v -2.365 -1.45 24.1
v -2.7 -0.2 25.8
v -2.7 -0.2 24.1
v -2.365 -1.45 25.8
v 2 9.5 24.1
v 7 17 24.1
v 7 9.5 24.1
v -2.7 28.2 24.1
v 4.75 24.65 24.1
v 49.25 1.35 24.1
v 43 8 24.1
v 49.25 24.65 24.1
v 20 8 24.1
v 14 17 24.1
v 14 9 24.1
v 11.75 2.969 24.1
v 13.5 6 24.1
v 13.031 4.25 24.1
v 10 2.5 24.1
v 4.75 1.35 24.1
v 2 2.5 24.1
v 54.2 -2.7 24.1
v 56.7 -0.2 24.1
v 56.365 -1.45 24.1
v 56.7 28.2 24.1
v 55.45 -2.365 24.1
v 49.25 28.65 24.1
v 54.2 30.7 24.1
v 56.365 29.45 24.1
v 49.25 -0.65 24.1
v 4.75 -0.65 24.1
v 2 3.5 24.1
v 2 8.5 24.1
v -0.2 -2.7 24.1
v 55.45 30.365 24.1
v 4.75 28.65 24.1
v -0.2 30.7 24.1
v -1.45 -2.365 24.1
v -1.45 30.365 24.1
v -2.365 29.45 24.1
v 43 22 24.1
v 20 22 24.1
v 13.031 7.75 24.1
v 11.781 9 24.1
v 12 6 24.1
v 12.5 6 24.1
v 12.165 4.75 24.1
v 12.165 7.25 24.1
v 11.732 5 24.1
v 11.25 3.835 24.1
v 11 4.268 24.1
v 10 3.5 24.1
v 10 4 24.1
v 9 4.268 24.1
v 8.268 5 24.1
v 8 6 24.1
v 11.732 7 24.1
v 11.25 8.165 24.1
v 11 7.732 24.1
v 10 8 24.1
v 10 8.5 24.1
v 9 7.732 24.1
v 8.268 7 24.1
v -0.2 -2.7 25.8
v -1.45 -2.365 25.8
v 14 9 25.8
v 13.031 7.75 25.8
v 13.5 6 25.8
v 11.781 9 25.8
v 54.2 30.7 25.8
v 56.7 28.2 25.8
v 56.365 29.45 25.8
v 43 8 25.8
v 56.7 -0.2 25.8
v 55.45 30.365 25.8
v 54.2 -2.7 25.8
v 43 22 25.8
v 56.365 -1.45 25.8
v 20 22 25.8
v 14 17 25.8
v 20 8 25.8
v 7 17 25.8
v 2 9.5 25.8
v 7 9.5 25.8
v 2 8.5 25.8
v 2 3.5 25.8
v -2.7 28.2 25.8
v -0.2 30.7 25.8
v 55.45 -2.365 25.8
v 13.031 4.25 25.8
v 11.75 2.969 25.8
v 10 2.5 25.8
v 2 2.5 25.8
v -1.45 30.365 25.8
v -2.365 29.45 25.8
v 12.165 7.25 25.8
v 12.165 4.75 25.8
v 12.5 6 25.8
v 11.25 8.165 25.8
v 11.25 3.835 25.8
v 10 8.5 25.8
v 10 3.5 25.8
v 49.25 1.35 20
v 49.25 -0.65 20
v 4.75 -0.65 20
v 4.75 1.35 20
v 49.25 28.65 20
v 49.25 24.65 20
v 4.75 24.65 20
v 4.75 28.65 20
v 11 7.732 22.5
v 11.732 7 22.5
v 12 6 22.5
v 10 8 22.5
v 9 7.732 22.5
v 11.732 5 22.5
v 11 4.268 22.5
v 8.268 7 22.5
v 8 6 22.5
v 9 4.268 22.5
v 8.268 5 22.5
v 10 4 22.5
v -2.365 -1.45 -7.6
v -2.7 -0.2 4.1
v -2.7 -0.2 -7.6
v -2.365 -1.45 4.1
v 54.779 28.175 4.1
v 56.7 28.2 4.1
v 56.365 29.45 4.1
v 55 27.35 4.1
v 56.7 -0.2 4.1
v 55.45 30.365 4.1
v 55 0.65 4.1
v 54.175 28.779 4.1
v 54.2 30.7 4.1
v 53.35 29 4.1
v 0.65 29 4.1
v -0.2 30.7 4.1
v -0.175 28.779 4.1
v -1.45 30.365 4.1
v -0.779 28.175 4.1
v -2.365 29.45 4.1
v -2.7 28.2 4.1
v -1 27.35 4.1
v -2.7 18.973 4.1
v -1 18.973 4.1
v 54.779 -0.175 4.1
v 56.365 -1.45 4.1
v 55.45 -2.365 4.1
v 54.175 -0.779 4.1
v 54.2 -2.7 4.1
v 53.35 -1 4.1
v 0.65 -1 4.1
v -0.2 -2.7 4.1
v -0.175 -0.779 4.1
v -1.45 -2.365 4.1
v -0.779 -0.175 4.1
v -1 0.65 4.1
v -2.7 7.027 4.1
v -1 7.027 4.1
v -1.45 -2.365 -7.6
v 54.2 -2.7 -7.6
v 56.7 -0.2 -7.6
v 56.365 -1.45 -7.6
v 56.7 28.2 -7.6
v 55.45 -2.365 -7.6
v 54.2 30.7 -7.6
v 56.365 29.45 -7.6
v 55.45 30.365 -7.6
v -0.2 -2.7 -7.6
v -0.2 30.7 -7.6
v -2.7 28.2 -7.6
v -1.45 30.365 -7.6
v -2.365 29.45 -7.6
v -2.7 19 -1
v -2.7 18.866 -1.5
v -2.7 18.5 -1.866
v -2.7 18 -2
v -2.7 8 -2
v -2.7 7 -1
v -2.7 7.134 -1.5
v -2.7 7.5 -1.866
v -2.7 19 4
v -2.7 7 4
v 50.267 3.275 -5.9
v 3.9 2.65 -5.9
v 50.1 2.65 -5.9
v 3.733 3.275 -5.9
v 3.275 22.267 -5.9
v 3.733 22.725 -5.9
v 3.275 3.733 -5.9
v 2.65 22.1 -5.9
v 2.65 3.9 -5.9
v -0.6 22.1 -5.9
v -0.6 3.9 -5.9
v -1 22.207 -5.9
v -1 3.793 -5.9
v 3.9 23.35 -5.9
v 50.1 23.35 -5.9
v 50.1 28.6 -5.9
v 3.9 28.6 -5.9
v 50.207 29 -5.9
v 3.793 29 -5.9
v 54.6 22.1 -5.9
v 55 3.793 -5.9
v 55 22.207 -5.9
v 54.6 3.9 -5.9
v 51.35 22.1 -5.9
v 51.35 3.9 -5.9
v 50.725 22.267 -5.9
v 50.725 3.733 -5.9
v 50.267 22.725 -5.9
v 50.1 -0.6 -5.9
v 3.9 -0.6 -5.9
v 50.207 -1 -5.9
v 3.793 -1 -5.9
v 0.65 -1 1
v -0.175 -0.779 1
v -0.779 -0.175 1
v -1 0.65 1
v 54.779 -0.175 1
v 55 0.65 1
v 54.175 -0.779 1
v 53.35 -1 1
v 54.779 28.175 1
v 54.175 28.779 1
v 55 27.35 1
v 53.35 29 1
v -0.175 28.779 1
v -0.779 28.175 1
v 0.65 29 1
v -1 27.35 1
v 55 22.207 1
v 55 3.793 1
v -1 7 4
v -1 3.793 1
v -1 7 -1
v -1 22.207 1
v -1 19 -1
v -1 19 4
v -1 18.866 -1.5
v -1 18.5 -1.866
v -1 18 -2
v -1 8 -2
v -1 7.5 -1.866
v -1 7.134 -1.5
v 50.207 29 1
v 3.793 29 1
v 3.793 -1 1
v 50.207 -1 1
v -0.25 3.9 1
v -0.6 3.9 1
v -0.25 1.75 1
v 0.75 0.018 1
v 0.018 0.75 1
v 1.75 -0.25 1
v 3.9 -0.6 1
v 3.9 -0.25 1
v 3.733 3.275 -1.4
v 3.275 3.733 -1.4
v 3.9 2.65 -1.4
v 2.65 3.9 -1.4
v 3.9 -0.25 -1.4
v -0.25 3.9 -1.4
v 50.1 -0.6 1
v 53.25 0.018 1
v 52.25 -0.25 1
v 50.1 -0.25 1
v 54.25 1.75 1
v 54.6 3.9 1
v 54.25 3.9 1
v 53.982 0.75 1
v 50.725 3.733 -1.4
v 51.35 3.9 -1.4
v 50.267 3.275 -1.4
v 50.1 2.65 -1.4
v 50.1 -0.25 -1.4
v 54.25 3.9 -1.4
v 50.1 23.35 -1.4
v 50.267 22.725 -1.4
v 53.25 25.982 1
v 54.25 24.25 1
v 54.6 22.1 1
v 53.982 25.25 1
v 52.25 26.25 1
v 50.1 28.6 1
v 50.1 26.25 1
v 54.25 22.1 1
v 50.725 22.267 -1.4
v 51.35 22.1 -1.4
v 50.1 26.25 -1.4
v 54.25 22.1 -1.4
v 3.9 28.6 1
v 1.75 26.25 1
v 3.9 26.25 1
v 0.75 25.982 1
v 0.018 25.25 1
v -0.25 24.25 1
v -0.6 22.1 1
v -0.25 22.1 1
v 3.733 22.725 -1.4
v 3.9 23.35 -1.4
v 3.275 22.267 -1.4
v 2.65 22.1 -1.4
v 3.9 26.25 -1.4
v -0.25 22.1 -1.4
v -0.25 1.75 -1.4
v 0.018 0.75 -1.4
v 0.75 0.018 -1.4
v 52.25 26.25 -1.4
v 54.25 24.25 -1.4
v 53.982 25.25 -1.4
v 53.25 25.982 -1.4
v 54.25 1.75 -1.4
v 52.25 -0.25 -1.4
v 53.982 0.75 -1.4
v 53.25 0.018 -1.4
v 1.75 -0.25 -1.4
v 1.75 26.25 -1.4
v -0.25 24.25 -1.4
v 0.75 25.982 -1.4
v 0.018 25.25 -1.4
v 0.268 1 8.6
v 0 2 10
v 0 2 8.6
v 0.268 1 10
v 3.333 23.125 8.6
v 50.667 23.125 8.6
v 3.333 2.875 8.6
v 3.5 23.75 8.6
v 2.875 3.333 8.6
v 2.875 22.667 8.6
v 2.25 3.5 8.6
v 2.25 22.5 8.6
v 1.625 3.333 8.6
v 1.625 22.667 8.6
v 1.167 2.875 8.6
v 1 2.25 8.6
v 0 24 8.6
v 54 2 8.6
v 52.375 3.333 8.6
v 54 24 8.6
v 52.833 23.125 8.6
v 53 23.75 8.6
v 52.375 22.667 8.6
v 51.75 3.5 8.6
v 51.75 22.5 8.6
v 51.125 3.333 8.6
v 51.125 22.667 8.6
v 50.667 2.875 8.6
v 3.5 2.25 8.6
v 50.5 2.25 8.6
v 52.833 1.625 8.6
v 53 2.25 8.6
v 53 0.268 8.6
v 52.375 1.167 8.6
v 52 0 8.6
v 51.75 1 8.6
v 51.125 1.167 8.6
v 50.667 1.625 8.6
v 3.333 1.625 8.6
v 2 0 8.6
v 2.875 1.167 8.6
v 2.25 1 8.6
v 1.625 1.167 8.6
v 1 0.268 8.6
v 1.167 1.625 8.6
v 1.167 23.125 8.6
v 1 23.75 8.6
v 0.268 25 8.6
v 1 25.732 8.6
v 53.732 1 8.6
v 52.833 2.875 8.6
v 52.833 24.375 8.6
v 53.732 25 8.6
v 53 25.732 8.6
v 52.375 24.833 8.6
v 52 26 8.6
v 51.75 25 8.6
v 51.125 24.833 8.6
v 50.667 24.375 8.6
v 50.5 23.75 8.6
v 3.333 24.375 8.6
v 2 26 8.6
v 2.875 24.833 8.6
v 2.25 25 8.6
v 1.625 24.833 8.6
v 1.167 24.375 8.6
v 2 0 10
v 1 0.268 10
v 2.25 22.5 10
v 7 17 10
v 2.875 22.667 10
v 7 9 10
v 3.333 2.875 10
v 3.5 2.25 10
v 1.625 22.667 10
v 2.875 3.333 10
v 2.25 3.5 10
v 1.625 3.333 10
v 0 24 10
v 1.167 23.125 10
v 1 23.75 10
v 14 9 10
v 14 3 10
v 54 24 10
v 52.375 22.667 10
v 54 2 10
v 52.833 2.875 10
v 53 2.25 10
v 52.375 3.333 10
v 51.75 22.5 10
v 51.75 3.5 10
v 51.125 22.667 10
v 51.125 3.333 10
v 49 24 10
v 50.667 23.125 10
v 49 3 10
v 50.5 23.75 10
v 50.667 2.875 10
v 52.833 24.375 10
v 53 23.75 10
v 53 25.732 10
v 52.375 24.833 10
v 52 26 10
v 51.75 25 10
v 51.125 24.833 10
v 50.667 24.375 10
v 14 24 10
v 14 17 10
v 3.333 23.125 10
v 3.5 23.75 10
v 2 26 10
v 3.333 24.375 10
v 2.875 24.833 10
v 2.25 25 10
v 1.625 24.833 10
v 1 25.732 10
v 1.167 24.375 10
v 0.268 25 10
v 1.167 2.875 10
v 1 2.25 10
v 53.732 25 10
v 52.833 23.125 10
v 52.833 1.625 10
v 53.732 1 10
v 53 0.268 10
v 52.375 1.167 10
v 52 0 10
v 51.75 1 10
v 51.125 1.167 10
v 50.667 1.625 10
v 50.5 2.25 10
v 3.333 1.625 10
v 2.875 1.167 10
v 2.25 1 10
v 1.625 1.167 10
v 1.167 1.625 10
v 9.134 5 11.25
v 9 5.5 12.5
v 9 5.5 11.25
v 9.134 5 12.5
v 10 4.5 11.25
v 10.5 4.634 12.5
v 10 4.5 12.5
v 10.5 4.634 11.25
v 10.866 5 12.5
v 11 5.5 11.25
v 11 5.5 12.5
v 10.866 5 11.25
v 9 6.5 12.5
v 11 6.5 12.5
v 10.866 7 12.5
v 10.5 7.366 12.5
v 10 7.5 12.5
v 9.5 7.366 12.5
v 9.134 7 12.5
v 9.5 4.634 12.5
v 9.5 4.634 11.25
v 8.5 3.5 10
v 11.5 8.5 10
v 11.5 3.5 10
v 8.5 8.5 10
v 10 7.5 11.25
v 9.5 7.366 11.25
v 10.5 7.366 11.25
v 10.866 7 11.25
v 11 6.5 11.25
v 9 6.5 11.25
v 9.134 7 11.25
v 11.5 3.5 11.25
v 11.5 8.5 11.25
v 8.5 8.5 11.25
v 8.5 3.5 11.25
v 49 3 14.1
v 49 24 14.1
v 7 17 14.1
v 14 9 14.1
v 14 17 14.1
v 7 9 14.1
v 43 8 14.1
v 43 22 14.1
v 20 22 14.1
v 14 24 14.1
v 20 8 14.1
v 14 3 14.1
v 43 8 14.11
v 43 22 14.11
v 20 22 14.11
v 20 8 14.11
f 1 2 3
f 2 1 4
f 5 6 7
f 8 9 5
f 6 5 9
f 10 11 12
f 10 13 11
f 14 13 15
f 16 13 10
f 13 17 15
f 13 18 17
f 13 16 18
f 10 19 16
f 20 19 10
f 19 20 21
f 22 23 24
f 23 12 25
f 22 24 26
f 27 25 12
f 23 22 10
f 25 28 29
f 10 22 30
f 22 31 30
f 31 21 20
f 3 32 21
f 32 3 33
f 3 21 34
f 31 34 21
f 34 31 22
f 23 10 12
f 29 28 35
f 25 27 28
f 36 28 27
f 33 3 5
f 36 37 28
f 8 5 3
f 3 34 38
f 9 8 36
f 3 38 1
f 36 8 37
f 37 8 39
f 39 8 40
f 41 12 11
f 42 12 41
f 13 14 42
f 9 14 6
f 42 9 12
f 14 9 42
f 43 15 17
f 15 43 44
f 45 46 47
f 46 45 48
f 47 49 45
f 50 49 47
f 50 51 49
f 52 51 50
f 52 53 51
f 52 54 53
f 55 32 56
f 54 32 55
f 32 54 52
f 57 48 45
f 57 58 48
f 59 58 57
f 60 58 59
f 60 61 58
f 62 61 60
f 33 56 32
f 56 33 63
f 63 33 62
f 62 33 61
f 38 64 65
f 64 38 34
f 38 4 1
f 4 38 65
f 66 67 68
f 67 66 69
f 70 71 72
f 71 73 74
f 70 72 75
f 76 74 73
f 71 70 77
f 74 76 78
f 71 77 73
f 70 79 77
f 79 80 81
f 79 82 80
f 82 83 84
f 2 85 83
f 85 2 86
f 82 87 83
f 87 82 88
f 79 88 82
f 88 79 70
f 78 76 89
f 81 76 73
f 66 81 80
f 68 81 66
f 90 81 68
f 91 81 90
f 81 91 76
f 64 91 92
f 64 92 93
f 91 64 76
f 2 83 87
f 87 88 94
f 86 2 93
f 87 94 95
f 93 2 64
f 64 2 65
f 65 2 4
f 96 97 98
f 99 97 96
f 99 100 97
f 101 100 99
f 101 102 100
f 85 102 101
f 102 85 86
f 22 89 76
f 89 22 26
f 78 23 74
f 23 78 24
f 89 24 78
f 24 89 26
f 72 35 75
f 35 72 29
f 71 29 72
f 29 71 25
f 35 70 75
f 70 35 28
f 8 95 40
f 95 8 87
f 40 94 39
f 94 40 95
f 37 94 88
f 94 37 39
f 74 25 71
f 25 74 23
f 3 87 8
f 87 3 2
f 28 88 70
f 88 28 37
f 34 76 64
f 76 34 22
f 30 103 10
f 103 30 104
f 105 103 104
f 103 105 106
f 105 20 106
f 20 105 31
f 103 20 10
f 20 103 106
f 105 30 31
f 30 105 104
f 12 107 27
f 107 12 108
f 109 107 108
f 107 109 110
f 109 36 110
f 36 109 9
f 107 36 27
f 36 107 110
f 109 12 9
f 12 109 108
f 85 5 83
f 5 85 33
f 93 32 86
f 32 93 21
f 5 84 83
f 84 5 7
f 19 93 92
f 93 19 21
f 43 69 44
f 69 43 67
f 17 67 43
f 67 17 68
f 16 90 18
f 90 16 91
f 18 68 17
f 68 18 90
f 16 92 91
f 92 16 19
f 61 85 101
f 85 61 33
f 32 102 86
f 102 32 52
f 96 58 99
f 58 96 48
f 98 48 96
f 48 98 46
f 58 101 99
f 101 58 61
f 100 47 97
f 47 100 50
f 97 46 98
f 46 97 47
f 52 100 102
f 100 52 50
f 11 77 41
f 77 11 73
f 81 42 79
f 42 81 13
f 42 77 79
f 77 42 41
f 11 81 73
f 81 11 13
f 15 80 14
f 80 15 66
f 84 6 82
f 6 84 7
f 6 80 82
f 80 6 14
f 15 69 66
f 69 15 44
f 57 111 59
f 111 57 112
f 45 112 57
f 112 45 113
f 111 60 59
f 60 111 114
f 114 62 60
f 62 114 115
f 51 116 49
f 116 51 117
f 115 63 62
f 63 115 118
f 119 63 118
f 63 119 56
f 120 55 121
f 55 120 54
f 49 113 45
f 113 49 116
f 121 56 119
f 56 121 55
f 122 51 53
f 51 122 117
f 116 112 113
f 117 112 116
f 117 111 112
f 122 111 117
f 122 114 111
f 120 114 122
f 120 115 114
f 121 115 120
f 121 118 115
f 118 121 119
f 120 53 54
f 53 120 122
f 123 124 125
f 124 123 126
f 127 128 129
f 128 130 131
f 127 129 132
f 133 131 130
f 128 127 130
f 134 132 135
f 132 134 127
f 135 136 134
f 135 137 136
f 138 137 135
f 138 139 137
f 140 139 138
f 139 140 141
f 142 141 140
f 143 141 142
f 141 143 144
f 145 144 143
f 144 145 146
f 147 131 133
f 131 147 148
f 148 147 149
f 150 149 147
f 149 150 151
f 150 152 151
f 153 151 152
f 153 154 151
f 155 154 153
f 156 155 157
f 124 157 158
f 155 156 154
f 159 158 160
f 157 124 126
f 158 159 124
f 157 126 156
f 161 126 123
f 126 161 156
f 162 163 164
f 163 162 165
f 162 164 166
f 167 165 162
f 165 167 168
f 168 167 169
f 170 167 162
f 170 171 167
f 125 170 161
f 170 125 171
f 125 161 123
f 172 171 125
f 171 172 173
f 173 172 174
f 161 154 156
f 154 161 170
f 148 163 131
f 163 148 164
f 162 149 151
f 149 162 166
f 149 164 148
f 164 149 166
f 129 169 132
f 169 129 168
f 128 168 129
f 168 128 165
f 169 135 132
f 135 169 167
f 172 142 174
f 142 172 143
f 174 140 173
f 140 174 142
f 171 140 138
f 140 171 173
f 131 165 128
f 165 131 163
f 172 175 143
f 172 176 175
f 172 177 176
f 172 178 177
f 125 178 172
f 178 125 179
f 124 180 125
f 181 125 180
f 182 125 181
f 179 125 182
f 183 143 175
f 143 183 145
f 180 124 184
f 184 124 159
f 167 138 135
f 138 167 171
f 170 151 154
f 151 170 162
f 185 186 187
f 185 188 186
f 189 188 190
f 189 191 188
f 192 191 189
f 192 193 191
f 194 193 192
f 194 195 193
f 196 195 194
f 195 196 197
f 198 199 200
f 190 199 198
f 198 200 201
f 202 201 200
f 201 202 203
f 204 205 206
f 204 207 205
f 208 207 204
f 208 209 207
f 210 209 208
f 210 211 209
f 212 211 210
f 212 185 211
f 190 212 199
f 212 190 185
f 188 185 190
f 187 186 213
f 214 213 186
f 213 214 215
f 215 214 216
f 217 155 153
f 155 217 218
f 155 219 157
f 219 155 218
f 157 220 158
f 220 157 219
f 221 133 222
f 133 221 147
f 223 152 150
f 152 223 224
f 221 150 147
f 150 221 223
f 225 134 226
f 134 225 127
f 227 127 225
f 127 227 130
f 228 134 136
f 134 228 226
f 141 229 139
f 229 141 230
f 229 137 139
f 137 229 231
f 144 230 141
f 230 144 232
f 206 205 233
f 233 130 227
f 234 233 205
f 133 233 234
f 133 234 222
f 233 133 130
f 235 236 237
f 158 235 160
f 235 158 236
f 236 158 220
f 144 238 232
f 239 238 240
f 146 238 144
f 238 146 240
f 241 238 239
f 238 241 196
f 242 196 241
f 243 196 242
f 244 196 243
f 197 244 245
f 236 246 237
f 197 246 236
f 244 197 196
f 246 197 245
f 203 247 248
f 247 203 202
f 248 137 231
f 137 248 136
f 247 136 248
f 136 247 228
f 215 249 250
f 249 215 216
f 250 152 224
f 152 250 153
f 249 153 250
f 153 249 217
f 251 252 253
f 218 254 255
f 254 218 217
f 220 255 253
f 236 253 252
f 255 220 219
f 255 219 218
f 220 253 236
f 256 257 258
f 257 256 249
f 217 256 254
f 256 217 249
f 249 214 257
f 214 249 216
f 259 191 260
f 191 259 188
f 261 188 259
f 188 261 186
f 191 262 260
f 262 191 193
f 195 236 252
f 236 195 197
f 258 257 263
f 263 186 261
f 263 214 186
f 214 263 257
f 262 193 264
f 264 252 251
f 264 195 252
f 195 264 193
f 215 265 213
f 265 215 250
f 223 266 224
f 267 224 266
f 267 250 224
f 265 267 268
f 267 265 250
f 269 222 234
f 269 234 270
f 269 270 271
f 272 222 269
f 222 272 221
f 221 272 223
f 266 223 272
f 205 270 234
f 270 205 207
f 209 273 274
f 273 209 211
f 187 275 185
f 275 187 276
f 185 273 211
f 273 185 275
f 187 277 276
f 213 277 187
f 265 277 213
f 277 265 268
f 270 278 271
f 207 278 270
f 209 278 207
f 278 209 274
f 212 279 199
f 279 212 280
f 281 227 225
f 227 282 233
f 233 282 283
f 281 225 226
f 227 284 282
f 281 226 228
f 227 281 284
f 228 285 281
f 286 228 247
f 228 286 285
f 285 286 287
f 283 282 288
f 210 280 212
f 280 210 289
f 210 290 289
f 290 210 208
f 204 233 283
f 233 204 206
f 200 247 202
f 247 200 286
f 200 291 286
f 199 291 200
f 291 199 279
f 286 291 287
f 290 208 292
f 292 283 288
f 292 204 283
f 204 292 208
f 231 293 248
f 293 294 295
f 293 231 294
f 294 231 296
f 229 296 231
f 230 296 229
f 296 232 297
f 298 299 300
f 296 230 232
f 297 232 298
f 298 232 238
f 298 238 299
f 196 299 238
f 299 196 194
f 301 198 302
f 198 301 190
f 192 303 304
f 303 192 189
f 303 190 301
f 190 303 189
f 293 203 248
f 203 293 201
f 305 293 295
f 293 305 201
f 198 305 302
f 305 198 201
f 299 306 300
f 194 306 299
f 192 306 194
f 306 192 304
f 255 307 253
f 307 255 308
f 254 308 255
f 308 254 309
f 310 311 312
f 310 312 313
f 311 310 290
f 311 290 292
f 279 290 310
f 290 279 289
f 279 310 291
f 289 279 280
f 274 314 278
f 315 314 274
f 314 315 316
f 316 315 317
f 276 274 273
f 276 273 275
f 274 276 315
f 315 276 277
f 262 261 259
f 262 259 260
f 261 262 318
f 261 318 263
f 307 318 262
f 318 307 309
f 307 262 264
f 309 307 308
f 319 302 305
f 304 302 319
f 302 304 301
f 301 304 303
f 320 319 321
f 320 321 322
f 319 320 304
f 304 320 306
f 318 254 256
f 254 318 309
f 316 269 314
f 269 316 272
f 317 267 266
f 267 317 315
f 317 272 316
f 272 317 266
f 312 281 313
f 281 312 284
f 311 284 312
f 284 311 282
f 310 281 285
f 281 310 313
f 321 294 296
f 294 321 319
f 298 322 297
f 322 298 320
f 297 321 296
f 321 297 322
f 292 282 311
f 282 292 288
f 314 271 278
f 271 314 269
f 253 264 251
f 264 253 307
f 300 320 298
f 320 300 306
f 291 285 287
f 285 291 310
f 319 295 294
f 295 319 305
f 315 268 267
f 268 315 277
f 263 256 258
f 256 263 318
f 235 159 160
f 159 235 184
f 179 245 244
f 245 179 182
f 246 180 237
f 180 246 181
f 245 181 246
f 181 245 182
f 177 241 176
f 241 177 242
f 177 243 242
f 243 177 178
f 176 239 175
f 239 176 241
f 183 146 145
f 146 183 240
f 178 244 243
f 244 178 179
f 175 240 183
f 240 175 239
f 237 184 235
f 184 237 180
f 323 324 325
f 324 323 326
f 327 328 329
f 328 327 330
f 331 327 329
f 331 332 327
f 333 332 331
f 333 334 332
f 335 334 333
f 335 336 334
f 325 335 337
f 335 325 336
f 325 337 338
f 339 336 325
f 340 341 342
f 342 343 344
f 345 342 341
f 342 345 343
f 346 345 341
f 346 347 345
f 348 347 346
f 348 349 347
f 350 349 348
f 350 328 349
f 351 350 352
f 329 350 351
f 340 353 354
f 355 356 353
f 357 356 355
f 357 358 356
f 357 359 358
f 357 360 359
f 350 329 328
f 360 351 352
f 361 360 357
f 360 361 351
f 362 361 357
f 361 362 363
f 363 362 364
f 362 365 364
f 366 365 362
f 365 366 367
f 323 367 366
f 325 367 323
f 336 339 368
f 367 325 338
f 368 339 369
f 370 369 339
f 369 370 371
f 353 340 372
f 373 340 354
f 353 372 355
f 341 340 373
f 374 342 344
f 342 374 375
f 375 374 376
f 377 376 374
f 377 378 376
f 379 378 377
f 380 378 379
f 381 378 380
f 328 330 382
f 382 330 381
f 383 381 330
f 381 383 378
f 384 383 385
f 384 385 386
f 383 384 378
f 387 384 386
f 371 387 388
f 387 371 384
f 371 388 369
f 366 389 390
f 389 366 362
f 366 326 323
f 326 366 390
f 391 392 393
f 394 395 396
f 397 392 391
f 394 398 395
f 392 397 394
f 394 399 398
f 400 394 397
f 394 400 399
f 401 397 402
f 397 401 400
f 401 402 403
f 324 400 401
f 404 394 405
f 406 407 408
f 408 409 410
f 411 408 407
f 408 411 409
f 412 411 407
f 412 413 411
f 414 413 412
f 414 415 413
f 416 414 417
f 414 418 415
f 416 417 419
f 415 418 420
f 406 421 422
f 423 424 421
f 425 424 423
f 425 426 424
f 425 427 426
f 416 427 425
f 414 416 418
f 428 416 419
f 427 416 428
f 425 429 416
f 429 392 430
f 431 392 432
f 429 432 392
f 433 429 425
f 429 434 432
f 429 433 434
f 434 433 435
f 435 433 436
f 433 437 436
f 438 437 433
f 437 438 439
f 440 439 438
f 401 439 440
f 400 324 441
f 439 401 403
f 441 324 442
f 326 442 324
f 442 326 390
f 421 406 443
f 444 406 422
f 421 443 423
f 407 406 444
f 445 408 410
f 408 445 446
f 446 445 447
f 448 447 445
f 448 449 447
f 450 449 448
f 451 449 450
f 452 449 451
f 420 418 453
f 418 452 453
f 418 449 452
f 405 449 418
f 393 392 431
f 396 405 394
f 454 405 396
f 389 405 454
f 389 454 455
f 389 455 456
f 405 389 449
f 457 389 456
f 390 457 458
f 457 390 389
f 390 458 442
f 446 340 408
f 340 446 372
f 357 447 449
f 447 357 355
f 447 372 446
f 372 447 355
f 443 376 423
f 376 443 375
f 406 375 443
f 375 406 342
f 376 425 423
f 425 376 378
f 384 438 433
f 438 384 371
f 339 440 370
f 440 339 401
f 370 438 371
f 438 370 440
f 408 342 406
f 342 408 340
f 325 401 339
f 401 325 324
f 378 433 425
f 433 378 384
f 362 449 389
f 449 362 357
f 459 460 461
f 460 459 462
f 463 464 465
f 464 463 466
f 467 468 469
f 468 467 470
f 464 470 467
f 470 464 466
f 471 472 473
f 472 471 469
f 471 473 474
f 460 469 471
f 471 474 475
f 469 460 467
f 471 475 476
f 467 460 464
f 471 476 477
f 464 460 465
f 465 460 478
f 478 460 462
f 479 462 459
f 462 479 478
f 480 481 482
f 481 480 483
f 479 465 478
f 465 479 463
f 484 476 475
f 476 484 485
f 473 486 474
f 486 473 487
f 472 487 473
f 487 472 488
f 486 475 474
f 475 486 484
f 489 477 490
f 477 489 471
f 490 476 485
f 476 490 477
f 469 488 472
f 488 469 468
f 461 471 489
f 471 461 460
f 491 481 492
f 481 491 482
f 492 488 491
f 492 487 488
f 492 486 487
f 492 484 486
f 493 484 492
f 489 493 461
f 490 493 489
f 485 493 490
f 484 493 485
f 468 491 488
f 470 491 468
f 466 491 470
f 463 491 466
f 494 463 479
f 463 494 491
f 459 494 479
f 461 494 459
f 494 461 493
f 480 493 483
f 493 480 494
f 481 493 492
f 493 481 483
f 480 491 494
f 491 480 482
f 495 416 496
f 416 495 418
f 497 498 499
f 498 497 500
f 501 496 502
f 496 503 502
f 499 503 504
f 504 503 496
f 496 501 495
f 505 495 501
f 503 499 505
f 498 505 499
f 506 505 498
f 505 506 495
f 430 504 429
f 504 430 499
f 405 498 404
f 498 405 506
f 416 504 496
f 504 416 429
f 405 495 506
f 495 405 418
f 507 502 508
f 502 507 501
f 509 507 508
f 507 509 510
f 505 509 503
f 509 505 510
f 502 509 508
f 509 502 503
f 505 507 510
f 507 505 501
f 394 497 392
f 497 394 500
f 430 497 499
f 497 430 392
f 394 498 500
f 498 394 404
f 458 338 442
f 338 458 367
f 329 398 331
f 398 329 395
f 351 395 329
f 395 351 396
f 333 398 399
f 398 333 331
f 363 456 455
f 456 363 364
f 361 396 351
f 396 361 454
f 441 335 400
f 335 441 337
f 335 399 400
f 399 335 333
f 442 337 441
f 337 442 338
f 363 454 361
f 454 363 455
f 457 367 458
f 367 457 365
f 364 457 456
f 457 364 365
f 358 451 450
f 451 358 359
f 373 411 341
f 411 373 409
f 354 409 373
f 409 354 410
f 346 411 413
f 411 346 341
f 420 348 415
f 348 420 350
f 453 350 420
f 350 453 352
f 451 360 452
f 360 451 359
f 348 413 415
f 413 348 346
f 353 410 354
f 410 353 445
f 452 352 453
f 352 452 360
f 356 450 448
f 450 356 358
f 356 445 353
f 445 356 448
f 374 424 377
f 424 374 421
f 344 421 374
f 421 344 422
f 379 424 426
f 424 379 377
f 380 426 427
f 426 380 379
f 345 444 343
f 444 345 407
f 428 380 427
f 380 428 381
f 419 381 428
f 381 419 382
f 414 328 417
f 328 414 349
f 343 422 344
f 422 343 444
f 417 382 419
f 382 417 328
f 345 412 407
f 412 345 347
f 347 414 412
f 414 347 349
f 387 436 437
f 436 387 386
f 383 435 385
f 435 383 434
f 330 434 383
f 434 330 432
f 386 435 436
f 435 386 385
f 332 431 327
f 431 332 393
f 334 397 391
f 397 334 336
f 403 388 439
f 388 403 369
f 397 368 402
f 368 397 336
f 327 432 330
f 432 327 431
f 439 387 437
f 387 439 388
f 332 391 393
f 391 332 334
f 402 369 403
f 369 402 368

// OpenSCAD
showLid = true;
showBox = true;
showPCB = true;
arrangeForPrinting = false;
pcbExploded = 10;
lidExploded = 20;

// the board
pcbWidth = 26;
pcbLength = 54;
pcbThickness = 1.4;
pcbCornerRadius = 2;
pcbHolesFromCorners = 2.25;
pcbHoleDiameter = 2.5;

// board features
buttonPositions = [[10, 6]];
buttonHeight = 2.5;
screenGeometry = [14, 3, 35, 21, 4.1]; // x, y, length, width, z-height above the board of the whole screen block
screenFrameGeometry = [20, 8, 23, 14]; // x, y, length, width
usbLeftY = 7;
usbWidth = 12;
usbHeight = 7;
otherUpwardCutouts = [[7, 9, 7, 8]]; // x, y, length, width: this one is for the DIP switches

boxInnerHeight = 10;
boxRadius = 2.5;
pcbClearances = [1, 1, 1, 3]; // space between the box and the PCB: left, right, bottom, top
pcbFitClearance = 0.25; // adjust for your printer in case inner-hole sizes are too small and the PCB won't fit
pcbHolderExtraHeight = 1; // corner bosses stick up this much higher than the PCB
wallThickness = 1.7;
lipPcbOverlap = 1;	// How much of the edge of the PCB the lips should cover
lipClearance = 0.35;	// How much to inset lips for looser fit
$fn=12;

// -----------------------------------------
boxLength = pcbLength + wallThickness * 2 + pcbClearances[0] + pcbClearances[1];
boxWidth = pcbWidth + wallThickness * 2 + pcbClearances[2] + pcbClearances[3];
boxHeight = boxInnerHeight + wallThickness;
boxBottomToPcbTop = boxHeight - screenGeometry[4];
cornerStrutMinSize = pcbHolesFromCorners + pcbHoleDiameter;
lipHeight = boxHeight - boxBottomToPcbTop; // rails on the underside of the lid holding it in the box

module quad(length, width) {
	children([0:$children-1]);
	translate([length, 0, 0])
		children([0:$children-1]);
	translate([length, width, 0])
		children([0:$children-1]);
	translate([0, width, 0])
		children([0:$children-1]);
}

module roundCornersCube(dims, r=1, centerXY=false)
{
	translate(centerXY ? [dims[0] / -2, dims[1] / -2, 0] : [0,0,0])
	union() {
		translate([0, r, 0])
			cube([dims[0], dims[1] - r * 2, dims[2]]);
		translate([r, 0, 0])
			cube([dims[0] - r * 2, dims[1], dims[2]]);
		translate([r, r, 0])
			quad(dims[0] - r * 2, dims[1] - r * 2)
				cylinder(r = r, h = dims[2]);
	}
}

module dummyPCB(){
    translate([0,0,pcbExploded - pcbThickness]) difference() {
		union(){
			color ("green") roundCornersCube([pcbLength,pcbWidth,pcbThickness], pcbCornerRadius);
			color ("lightgray") translate([screenGeometry[0],screenGeometry[1],pcbThickness]) cube([screenGeometry[2],screenGeometry[3],screenGeometry[4]]);
			color ("gray") translate([screenFrameGeometry[0],screenFrameGeometry[1],pcbThickness]) cube([screenFrameGeometry[2],screenFrameGeometry[3],screenGeometry[4] + 0.01]);

			for (buttonPosition = buttonPositions) {
				translate([buttonPosition[0],buttonPosition[1],pcbThickness]) {
					translate([0, 0, buttonHeight / 4])
						color("lightgray") cube([3, 5, buttonHeight / 2], center=true);
					color("white") roundCornersCube([2,3,buttonHeight],1, centerXY=true);
				}
			}

			for (cutoutGeom = otherUpwardCutouts) {
				translate([cutoutGeom[0],cutoutGeom[1],pcbThickness])
					color("black") cube([cutoutGeom[2], cutoutGeom[3], screenGeometry[4]]);
			}
		}
		translate([pcbHolesFromCorners, pcbHolesFromCorners, 0])
			quad(pcbLength - pcbHolesFromCorners * 2, pcbWidth - pcbHolesFromCorners * 2)
				cylinder(d=pcbHoleDiameter, h=pcbThickness + 0.2);
	}
}

module buttonTabCutout(buttonPos, label) {
	z = wallThickness + 2;
	width = 7;
	length = 8;
	gap = 1;
	fontHeight = 4;
	difference() {
		union() {
			translate([buttonPos[0] - length, buttonPos[1] - width / 2, -1]) cube([length, width, z]);
			translate([buttonPos[0], buttonPos[1], -1]) cylinder(d=width, h=z);
		}
		union() {
			translate([buttonPos[0] - length, buttonPos[1] - width / 2 + gap, -1]) cube([length, width - gap * 2, z]);
			translate([buttonPos[0], buttonPos[1], -1]) cylinder(d=width - gap * 2, h=z);
		}
	}
	translate([buttonPos[0], buttonPos[1], wallThickness - 0.5])
		linear_extrude(wallThickness + 1) color("black")
			text(label, font = "Liberation Sans:style=Bold", fontHeight, halign = "center", valign="center");
}

module box() {
	difference() {
		translate([-wallThickness - pcbClearances[0], -wallThickness - pcbClearances[2], -boxBottomToPcbTop])
			union() {
				difference() {
					roundCornersCube([boxLength, boxWidth, boxHeight], boxRadius);
					translate([wallThickness, wallThickness, wallThickness])
						roundCornersCube([boxLength - wallThickness * 2,boxWidth - wallThickness * 2,boxHeight], boxRadius - wallThickness / 2);
				}
				translate([wallThickness / 2, wallThickness / 2, 0]) {
					roundCornersCube([cornerStrutMinSize + pcbClearances[0], cornerStrutMinSize + pcbClearances[2],
						boxBottomToPcbTop + pcbHolderExtraHeight], pcbHoleDiameter / 2);
					translate([boxLength - wallThickness - cornerStrutMinSize - pcbClearances[1], 0, 0])
						roundCornersCube([cornerStrutMinSize + pcbClearances[1], cornerStrutMinSize + pcbClearances[2],
							boxBottomToPcbTop + pcbHolderExtraHeight], pcbHoleDiameter / 2);
					translate([boxLength - wallThickness - cornerStrutMinSize - pcbClearances[1],
							   boxWidth - wallThickness - cornerStrutMinSize - pcbClearances[3], 0])
						roundCornersCube([cornerStrutMinSize + pcbClearances[1], cornerStrutMinSize + pcbClearances[3],
							boxBottomToPcbTop + pcbHolderExtraHeight], pcbHoleDiameter / 2);
					translate([0, boxWidth - wallThickness - cornerStrutMinSize - pcbClearances[3], 0])
						roundCornersCube([cornerStrutMinSize + pcbClearances[0], cornerStrutMinSize + pcbClearances[3],
							boxBottomToPcbTop + pcbHolderExtraHeight], pcbHoleDiameter / 2);
				}
			}
		// cut out the board footprint from the corner holders
		translate([-pcbFitClearance, -pcbFitClearance, -pcbThickness])
			roundCornersCube([pcbLength + pcbFitClearance * 2, pcbWidth + pcbFitClearance * 2, pcbThickness + pcbHolderExtraHeight + 1], pcbCornerRadius);
		// cut out around the USB jack
		translate([-1 - pcbClearances[0] - wallThickness, usbLeftY, usbHeight - (usbHeight - 3) / 2])
			rotate([0, 90, 0])
				roundCornersCube([usbHeight, usbWidth, wallThickness + 2], 1);
	}
}

module lid(exploded = lidExploded) {
	translate([0, 0, exploded + boxHeight - boxBottomToPcbTop]) {
		union() {
			difference() {
				translate([-wallThickness - pcbClearances[0], -wallThickness - pcbClearances[2], 0]) {
					union() {
						roundCornersCube([boxLength, boxWidth, wallThickness], boxRadius);
						lipX = wallThickness + cornerStrutMinSize + pcbClearances[0];
						translate([lipX, wallThickness + lipClearance, -lipHeight])
							cube([boxLength - lipX - wallThickness - cornerStrutMinSize - pcbClearances[1],
							      lipPcbOverlap + pcbClearances[2], lipHeight]);
						lipWidth = lipPcbOverlap + pcbClearances[3];
						translate([lipX, boxWidth - wallThickness - lipWidth - lipClearance, -lipHeight])
							cube([boxLength - lipX - wallThickness - cornerStrutMinSize - pcbClearances[1],
							      lipWidth, lipHeight]);
					}
				}
				translate([screenFrameGeometry[0], screenFrameGeometry[1], -1])
					cube([screenFrameGeometry[2], screenFrameGeometry[3], wallThickness + 2]);
				for (buttonPosition = buttonPositions)
					buttonTabCutout(buttonPosition, "");
				for (cutoutGeom = otherUpwardCutouts)
					translate([cutoutGeom[0],cutoutGeom[1],-1])
						cube([cutoutGeom[2], cutoutGeom[3], wallThickness + 2]);
			}
			for (buttonPosition = buttonPositions)
				translate([buttonPosition[0], buttonPosition[1], buttonHeight - screenGeometry[4]])
					cylinder(d=4, h=screenGeometry[4] - buttonHeight);
		}
	}
}

if (showLid) {
	if (arrangeForPrinting) {
		translate([0, -wallThickness * 2 - pcbClearances[3], boxHeight - boxBottomToPcbTop + wallThickness])
		rotate([180, 0, 0])
			lid(0);
	} else {
		lid();
	}
}
if (showBox) {
	if (arrangeForPrinting) {
		translate([0, 0, boxBottomToPcbTop])
			box();
	} else {
		box();
	}
}
if (showPCB && !arrangeForPrinting) {
    dummyPCB();
}
